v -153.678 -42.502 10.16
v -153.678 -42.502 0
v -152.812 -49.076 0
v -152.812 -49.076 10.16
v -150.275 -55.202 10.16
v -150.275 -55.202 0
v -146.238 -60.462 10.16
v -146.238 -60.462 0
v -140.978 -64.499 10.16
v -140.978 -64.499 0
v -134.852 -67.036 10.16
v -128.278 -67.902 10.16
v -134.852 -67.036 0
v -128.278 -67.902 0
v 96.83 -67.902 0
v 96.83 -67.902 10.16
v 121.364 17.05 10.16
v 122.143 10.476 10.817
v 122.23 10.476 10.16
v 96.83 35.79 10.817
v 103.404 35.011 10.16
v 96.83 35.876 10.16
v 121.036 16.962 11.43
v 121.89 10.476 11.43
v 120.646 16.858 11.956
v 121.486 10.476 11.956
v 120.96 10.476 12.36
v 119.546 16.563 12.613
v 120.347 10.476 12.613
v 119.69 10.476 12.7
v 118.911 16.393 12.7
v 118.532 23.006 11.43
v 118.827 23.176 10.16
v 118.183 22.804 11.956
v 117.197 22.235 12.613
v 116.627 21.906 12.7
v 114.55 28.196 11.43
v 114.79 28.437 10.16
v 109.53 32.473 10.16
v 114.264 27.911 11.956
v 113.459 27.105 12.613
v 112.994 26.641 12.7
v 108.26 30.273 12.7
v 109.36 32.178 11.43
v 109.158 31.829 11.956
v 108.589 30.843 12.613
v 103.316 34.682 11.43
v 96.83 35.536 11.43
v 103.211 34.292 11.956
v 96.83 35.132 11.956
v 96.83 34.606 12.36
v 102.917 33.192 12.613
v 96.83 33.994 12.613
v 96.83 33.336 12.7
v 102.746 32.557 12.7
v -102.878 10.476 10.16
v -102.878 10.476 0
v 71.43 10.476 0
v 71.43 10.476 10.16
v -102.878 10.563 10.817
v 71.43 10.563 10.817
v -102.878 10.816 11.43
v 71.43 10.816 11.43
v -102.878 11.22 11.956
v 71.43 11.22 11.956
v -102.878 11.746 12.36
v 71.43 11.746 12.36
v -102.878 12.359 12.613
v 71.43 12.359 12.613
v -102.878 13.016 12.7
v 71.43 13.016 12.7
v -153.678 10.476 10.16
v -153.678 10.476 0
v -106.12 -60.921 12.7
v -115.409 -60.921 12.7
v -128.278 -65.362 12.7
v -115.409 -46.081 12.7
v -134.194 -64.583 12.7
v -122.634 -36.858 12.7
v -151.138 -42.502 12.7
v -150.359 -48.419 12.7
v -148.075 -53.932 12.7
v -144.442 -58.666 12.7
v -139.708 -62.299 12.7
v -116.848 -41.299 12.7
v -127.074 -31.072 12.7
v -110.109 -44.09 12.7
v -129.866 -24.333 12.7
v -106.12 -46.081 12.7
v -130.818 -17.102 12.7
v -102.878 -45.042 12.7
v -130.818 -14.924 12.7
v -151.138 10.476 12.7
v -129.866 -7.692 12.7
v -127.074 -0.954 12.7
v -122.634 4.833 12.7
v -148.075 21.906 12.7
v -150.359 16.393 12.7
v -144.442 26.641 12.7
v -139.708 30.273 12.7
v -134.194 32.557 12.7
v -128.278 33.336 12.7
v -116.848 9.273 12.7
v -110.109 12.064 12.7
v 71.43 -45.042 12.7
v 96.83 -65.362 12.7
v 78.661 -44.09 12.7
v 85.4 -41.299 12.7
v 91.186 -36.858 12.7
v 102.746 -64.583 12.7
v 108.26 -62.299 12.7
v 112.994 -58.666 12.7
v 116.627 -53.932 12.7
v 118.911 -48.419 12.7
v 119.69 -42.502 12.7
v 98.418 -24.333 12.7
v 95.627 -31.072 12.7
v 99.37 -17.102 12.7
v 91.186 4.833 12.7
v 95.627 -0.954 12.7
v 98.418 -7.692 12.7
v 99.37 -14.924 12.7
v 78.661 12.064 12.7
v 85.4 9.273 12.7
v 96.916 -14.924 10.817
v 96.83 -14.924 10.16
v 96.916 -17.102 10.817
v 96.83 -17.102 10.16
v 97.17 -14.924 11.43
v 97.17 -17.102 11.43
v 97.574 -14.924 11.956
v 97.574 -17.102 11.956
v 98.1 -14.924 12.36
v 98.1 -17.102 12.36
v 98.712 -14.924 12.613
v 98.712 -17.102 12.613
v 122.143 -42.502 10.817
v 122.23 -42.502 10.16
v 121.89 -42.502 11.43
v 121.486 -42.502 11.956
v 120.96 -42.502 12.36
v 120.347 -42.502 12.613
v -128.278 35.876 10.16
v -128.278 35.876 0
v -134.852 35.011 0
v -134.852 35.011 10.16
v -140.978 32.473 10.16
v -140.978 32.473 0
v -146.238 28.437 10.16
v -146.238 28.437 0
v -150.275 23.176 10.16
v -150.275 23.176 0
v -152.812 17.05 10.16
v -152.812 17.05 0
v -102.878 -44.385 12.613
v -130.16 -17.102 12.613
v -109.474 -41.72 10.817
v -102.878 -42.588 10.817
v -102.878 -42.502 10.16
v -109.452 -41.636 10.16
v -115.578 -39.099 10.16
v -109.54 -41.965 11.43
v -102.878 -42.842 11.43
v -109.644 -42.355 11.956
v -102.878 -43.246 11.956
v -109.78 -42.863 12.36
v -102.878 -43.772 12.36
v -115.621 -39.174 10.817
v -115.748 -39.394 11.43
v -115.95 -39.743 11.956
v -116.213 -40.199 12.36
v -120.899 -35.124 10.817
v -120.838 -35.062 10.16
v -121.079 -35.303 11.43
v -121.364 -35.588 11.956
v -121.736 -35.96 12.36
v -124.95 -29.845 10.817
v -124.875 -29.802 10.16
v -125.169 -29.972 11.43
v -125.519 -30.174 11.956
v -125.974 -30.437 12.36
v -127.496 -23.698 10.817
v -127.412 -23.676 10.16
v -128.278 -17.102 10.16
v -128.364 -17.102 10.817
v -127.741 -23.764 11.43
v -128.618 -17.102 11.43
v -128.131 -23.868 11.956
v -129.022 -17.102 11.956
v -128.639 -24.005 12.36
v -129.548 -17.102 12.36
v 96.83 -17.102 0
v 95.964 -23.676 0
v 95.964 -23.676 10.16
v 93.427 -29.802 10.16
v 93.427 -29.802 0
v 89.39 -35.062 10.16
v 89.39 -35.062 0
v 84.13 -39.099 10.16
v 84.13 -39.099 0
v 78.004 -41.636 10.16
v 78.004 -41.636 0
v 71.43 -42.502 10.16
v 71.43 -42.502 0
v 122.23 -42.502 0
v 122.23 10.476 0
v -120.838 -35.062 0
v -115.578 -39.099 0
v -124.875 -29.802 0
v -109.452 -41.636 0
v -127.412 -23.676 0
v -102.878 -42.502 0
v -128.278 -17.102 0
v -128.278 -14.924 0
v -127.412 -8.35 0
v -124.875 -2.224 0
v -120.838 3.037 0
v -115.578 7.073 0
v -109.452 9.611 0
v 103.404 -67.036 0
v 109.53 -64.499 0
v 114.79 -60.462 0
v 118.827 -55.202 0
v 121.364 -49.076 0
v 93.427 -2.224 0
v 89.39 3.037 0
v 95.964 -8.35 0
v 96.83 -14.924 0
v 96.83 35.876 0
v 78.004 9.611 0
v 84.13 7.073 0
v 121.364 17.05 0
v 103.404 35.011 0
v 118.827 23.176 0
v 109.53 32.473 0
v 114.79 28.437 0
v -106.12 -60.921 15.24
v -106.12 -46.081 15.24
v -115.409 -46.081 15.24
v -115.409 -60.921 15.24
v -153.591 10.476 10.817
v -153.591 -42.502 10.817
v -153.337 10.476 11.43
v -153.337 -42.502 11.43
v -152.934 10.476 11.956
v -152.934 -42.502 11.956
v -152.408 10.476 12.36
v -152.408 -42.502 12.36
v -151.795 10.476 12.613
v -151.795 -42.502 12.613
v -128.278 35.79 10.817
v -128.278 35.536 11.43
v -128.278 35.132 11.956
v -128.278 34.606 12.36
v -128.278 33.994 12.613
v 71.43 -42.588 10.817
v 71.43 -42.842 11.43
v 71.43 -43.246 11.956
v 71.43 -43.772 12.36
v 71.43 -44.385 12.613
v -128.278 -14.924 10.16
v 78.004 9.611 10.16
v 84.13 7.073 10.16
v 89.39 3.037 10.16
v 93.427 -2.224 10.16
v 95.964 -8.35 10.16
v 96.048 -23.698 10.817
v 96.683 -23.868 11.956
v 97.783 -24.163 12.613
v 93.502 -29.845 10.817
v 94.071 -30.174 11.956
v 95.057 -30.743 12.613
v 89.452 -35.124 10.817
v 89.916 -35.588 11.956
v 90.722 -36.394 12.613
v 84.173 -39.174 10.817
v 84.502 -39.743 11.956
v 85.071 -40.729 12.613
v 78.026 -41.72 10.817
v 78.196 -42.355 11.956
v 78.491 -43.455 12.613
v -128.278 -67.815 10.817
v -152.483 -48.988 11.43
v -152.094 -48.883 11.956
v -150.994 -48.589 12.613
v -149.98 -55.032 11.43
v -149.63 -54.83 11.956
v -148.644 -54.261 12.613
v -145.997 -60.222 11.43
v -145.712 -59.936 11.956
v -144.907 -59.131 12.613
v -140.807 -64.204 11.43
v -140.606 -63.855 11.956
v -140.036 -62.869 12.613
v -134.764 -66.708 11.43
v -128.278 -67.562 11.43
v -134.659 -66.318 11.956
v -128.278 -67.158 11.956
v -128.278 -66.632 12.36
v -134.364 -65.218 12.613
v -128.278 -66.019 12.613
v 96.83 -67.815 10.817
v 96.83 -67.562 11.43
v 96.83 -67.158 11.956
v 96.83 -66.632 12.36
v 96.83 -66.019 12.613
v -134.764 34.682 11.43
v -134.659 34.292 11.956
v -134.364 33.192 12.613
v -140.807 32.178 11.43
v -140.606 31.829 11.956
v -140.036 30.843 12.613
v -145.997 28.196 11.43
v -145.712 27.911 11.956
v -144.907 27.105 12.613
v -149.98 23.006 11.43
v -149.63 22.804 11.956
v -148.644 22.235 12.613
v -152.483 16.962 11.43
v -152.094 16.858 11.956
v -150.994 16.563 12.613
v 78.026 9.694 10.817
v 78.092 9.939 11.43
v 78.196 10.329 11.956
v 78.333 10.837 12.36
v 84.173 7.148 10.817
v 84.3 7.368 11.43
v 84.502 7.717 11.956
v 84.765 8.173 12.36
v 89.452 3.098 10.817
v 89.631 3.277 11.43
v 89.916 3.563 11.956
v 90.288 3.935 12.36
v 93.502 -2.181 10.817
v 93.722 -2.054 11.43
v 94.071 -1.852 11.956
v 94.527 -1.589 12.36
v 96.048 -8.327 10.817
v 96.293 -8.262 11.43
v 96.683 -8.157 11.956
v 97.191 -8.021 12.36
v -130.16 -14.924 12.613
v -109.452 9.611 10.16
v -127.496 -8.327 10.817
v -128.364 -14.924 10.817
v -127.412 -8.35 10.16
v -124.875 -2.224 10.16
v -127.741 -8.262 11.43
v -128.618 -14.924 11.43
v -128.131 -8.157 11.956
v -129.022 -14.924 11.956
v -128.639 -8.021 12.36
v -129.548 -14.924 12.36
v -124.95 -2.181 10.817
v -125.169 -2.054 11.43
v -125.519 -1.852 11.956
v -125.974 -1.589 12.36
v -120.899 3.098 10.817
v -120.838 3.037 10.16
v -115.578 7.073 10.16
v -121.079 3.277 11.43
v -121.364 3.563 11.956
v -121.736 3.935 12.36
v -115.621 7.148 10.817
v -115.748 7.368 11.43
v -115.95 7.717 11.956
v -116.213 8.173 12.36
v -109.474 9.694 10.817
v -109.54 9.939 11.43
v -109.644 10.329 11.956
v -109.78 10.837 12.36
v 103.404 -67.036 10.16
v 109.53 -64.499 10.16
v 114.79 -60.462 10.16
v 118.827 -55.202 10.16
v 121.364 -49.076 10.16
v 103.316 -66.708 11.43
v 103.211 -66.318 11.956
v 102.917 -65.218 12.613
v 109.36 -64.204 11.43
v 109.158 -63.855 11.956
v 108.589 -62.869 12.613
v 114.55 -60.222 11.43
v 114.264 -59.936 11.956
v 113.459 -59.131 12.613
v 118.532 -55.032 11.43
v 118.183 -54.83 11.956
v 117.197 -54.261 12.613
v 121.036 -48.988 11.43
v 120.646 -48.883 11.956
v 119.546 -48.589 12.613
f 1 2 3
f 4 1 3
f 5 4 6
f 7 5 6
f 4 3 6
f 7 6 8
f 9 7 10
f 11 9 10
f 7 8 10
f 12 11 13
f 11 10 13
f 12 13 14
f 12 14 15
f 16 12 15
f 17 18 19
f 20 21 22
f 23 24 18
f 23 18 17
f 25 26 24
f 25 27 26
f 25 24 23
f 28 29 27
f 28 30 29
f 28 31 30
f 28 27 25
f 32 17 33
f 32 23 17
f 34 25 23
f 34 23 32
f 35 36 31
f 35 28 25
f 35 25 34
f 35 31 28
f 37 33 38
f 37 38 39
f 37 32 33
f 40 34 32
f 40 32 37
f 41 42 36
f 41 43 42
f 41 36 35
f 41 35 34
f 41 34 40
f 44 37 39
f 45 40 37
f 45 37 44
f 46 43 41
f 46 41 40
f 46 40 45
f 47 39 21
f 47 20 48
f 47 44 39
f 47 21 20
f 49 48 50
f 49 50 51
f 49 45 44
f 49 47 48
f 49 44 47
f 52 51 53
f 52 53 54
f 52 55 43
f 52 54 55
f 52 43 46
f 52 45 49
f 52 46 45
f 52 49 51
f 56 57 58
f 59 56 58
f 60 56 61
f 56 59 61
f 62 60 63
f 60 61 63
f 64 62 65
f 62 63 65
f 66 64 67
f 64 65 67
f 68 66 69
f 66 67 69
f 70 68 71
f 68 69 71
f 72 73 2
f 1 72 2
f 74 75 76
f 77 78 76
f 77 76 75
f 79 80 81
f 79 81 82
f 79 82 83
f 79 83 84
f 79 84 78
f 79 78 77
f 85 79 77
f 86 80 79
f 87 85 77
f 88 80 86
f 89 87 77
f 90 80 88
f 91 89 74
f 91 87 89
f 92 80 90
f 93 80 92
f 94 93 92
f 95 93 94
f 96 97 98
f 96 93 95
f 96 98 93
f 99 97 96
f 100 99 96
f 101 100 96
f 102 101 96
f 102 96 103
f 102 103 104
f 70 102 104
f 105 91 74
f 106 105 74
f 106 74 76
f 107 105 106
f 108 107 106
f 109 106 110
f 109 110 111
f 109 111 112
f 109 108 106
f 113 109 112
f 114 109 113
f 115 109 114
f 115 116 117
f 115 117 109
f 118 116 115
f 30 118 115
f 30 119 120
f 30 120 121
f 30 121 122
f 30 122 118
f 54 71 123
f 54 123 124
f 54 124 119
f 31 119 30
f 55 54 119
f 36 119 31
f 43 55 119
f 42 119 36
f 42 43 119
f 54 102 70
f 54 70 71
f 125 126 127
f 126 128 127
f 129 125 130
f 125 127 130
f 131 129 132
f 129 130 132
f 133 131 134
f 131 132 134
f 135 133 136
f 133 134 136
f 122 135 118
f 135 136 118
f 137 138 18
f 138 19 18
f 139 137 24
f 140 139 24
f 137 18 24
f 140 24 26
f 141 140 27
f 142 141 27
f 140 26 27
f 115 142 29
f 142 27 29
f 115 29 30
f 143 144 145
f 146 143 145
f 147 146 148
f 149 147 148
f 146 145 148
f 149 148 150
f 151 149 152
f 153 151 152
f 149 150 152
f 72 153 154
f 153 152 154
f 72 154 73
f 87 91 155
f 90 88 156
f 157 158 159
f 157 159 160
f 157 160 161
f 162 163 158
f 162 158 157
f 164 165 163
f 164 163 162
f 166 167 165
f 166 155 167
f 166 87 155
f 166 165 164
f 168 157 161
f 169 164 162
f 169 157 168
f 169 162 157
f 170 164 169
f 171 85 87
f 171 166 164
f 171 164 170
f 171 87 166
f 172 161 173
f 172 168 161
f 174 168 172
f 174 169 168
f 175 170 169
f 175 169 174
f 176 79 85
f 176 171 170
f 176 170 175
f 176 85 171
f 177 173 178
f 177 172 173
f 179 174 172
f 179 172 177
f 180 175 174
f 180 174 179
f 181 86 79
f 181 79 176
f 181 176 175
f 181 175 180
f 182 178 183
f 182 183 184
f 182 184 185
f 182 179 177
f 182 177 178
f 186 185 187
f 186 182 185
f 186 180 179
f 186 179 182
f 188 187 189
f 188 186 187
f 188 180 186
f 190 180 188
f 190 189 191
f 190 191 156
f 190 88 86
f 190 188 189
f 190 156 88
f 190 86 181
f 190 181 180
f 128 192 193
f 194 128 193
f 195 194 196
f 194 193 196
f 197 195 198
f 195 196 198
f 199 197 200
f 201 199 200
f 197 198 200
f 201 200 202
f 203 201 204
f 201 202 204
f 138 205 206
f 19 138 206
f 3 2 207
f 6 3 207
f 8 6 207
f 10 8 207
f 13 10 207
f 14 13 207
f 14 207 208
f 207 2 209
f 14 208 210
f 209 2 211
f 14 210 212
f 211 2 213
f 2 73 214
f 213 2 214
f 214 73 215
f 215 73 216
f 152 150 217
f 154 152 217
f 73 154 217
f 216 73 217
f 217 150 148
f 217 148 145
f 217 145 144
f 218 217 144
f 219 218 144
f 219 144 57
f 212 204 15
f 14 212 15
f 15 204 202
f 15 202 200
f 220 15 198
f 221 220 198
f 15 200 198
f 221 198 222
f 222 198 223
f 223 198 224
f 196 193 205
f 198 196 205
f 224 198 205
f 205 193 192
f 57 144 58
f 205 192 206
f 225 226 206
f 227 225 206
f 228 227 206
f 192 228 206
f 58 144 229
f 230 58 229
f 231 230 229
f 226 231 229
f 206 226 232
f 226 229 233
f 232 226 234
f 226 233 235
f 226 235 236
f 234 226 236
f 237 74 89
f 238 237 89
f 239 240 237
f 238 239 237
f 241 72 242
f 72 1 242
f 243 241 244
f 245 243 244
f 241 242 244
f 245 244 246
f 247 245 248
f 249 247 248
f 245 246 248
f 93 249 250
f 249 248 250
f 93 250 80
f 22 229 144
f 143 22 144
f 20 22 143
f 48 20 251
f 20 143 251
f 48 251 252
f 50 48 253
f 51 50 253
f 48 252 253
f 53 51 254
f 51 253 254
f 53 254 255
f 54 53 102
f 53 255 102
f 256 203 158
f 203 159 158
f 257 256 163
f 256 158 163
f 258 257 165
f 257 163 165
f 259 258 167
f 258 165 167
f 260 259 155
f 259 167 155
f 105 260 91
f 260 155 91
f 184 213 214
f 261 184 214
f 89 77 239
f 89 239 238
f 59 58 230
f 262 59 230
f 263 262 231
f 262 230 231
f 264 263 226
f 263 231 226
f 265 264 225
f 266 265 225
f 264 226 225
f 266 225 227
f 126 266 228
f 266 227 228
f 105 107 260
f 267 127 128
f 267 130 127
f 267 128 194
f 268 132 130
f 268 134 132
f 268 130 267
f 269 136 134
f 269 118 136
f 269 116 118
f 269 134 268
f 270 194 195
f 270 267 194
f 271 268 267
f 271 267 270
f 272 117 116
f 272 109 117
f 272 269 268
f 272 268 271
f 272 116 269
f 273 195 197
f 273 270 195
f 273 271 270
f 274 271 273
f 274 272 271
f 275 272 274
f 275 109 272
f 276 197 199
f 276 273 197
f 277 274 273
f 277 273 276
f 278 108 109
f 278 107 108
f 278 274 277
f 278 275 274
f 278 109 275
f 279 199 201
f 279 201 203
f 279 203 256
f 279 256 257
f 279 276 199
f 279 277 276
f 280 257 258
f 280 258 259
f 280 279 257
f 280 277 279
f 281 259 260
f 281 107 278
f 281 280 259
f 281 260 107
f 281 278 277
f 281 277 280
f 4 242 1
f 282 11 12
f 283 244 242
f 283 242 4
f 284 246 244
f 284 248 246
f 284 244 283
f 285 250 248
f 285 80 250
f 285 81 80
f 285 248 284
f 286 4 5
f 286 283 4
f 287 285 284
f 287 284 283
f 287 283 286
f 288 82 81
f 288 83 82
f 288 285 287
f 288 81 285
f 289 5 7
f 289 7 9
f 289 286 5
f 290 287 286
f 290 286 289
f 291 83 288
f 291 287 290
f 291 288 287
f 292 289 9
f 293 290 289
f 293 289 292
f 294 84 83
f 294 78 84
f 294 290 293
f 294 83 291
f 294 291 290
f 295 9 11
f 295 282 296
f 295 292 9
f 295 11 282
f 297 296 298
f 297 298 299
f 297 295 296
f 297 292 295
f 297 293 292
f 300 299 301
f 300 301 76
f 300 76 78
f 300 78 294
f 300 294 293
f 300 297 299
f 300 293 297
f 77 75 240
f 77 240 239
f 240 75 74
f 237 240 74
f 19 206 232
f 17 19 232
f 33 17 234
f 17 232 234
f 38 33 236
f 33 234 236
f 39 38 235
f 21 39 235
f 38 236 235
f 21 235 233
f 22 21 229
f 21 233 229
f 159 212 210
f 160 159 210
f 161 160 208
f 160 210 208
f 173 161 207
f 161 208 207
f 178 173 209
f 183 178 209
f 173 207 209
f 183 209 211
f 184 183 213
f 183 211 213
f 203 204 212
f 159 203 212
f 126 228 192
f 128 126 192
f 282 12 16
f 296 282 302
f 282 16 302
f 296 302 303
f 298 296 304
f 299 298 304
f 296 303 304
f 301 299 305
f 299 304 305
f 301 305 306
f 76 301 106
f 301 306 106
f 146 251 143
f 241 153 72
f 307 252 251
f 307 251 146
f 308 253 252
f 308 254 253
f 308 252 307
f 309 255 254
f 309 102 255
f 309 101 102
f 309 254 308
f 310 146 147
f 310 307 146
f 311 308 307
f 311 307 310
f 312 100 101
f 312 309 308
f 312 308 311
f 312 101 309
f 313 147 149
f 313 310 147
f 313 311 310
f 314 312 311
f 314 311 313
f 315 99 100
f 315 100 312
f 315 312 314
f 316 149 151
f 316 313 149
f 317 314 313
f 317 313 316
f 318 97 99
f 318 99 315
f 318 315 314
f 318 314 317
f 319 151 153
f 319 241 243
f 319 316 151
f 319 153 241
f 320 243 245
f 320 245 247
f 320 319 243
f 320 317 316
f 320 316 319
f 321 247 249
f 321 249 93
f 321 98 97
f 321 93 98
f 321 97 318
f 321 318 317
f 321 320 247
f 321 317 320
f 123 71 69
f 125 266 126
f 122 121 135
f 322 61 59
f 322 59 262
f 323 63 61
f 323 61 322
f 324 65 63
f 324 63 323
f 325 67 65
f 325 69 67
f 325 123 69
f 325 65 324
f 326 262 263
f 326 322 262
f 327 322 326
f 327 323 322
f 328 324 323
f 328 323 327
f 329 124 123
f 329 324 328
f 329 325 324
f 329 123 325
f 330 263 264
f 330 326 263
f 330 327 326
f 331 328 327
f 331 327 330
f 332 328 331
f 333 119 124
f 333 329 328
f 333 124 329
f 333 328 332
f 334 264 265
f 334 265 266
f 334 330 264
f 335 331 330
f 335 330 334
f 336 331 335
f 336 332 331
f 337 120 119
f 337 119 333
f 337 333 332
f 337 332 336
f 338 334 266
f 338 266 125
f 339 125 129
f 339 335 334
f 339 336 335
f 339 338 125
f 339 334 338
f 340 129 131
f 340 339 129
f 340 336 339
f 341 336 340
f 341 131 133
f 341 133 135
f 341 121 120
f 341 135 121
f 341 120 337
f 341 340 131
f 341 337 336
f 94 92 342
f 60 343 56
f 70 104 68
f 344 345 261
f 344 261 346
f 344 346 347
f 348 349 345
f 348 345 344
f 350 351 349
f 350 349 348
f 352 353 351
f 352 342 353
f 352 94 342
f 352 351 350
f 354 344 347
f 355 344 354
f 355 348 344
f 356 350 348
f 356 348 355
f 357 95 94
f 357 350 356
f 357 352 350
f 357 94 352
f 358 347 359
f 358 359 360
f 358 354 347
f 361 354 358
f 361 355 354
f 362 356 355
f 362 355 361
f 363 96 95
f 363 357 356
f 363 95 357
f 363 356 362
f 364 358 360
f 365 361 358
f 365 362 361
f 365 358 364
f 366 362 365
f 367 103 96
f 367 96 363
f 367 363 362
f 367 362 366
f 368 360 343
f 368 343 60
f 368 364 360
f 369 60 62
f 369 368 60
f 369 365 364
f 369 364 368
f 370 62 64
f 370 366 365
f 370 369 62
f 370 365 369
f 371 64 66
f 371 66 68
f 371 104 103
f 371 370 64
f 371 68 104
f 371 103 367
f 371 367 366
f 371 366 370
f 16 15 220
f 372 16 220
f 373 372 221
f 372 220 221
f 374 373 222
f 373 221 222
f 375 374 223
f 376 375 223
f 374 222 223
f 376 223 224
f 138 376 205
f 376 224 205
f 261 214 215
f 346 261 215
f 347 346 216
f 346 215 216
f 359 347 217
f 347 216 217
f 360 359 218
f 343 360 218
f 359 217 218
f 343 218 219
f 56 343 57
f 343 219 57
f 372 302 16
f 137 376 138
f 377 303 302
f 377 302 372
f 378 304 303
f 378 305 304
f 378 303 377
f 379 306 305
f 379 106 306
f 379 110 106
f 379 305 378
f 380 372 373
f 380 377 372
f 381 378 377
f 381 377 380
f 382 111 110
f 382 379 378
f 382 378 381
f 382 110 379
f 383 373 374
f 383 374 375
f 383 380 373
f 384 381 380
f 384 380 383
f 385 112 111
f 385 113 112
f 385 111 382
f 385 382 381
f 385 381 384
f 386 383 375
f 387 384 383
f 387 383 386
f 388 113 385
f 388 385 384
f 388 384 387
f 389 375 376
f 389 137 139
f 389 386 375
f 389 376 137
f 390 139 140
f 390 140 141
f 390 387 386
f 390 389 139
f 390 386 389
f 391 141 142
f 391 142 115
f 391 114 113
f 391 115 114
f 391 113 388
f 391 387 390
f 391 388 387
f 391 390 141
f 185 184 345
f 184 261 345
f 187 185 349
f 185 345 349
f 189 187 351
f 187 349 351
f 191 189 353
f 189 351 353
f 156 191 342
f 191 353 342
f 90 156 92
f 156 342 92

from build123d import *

# Parameters (mm, degrees)
F1_DEPTH = 12.7
F2_R     = 2.54
F3_W     = 9.28931
F3_H     = 14.83982
F4_DEPTH = 2.54


with BuildPart() as f1:
    # F0 (on Top) → F1 (new body)
    with BuildSketch(Plane.XY):
        with BuildLine():
            Line((96.829839, 35.876159), (-128.277585, 35.876159))
            ThreePointArc((-128.277585, 35.876159), (-146.238097, 28.436672), (-153.677585, 10.476159))
            Line((-153.677585, 10.476159), (-153.677585, -42.501916))
            ThreePointArc((-153.677585, -42.501916), (-146.238097, -60.462429), (-128.277585, -67.901916))
            Line((-128.277585, -67.901916), (96.829839, -67.901916))
            ThreePointArc((96.829839, -67.901916), (114.790351, -60.462429), (122.229839, -42.501916))
            Line((122.229839, -42.501916), (122.229839, 10.476159))
            ThreePointArc((122.229839, 10.476159), (114.790351, 28.436672), (96.829839, 35.876159))
        make_face()
        with BuildLine():
            Line((71.429839, -42.501916), (-102.877585, -42.501916))
            ThreePointArc((-102.877585, -42.501916), (-120.838097, -35.062429), (-128.277585, -17.101916))
            Line((-128.277585, -17.101916), (-128.277585, -14.923841))
            ThreePointArc((-128.277585, -14.923841), (-120.838097, 3.036672), (-102.877585, 10.476159))
            Line((-102.877585, 10.476159), (71.429839, 10.476159))
            ThreePointArc((71.429839, 10.476159), (89.390351, 3.036672), (96.829839, -14.923841))
            Line((96.829839, -14.923841), (96.829839, -17.101916))
            ThreePointArc((96.829839, -17.101916), (89.390351, -35.062429), (71.429839, -42.501916))
        make_face(mode=Mode.SUBTRACT)
    extrude(amount=F1_DEPTH)

    # F2
    f2_edges = [f1.edges().sort_by_distance(p)[0] for p in [
        (-15.723873, 35.876159, 12.7),
        (-146.238097, 28.436672, 12.7),
        (-153.677585, -16.012879, 12.7),
        (-146.238097, -60.462429, 12.7),
        (-15.723873, -67.901916, 12.7),
        (114.790351, -60.462429, 12.7),
        (122.229839, -16.012879, 12.7),
        (114.790351, 28.436672, 12.7),
        (-15.723873, -42.501916, 12.7),
        (-120.838097, -35.062429, 12.7),
        (-128.277585, -16.012879, 12.7),
        (-120.838097, 3.036672, 12.7),
        (-15.723873, 10.476159, 12.7),
        (89.390351, 3.036672, 12.7),
        (96.829839, -16.012879, 12.7),
        (89.390351, -35.062429, 12.7),
    ]]
    fillet(f2_edges, radius=F2_R)

    # F3 (on face) → F4 (join)
    with BuildSketch(Plane.XY.offset(12.7)):
        with Locations((-110.76466, -53.500641)):
            Rectangle(F3_W, F3_H)
    extrude(amount=F4_DEPTH)


solid = f1.part
